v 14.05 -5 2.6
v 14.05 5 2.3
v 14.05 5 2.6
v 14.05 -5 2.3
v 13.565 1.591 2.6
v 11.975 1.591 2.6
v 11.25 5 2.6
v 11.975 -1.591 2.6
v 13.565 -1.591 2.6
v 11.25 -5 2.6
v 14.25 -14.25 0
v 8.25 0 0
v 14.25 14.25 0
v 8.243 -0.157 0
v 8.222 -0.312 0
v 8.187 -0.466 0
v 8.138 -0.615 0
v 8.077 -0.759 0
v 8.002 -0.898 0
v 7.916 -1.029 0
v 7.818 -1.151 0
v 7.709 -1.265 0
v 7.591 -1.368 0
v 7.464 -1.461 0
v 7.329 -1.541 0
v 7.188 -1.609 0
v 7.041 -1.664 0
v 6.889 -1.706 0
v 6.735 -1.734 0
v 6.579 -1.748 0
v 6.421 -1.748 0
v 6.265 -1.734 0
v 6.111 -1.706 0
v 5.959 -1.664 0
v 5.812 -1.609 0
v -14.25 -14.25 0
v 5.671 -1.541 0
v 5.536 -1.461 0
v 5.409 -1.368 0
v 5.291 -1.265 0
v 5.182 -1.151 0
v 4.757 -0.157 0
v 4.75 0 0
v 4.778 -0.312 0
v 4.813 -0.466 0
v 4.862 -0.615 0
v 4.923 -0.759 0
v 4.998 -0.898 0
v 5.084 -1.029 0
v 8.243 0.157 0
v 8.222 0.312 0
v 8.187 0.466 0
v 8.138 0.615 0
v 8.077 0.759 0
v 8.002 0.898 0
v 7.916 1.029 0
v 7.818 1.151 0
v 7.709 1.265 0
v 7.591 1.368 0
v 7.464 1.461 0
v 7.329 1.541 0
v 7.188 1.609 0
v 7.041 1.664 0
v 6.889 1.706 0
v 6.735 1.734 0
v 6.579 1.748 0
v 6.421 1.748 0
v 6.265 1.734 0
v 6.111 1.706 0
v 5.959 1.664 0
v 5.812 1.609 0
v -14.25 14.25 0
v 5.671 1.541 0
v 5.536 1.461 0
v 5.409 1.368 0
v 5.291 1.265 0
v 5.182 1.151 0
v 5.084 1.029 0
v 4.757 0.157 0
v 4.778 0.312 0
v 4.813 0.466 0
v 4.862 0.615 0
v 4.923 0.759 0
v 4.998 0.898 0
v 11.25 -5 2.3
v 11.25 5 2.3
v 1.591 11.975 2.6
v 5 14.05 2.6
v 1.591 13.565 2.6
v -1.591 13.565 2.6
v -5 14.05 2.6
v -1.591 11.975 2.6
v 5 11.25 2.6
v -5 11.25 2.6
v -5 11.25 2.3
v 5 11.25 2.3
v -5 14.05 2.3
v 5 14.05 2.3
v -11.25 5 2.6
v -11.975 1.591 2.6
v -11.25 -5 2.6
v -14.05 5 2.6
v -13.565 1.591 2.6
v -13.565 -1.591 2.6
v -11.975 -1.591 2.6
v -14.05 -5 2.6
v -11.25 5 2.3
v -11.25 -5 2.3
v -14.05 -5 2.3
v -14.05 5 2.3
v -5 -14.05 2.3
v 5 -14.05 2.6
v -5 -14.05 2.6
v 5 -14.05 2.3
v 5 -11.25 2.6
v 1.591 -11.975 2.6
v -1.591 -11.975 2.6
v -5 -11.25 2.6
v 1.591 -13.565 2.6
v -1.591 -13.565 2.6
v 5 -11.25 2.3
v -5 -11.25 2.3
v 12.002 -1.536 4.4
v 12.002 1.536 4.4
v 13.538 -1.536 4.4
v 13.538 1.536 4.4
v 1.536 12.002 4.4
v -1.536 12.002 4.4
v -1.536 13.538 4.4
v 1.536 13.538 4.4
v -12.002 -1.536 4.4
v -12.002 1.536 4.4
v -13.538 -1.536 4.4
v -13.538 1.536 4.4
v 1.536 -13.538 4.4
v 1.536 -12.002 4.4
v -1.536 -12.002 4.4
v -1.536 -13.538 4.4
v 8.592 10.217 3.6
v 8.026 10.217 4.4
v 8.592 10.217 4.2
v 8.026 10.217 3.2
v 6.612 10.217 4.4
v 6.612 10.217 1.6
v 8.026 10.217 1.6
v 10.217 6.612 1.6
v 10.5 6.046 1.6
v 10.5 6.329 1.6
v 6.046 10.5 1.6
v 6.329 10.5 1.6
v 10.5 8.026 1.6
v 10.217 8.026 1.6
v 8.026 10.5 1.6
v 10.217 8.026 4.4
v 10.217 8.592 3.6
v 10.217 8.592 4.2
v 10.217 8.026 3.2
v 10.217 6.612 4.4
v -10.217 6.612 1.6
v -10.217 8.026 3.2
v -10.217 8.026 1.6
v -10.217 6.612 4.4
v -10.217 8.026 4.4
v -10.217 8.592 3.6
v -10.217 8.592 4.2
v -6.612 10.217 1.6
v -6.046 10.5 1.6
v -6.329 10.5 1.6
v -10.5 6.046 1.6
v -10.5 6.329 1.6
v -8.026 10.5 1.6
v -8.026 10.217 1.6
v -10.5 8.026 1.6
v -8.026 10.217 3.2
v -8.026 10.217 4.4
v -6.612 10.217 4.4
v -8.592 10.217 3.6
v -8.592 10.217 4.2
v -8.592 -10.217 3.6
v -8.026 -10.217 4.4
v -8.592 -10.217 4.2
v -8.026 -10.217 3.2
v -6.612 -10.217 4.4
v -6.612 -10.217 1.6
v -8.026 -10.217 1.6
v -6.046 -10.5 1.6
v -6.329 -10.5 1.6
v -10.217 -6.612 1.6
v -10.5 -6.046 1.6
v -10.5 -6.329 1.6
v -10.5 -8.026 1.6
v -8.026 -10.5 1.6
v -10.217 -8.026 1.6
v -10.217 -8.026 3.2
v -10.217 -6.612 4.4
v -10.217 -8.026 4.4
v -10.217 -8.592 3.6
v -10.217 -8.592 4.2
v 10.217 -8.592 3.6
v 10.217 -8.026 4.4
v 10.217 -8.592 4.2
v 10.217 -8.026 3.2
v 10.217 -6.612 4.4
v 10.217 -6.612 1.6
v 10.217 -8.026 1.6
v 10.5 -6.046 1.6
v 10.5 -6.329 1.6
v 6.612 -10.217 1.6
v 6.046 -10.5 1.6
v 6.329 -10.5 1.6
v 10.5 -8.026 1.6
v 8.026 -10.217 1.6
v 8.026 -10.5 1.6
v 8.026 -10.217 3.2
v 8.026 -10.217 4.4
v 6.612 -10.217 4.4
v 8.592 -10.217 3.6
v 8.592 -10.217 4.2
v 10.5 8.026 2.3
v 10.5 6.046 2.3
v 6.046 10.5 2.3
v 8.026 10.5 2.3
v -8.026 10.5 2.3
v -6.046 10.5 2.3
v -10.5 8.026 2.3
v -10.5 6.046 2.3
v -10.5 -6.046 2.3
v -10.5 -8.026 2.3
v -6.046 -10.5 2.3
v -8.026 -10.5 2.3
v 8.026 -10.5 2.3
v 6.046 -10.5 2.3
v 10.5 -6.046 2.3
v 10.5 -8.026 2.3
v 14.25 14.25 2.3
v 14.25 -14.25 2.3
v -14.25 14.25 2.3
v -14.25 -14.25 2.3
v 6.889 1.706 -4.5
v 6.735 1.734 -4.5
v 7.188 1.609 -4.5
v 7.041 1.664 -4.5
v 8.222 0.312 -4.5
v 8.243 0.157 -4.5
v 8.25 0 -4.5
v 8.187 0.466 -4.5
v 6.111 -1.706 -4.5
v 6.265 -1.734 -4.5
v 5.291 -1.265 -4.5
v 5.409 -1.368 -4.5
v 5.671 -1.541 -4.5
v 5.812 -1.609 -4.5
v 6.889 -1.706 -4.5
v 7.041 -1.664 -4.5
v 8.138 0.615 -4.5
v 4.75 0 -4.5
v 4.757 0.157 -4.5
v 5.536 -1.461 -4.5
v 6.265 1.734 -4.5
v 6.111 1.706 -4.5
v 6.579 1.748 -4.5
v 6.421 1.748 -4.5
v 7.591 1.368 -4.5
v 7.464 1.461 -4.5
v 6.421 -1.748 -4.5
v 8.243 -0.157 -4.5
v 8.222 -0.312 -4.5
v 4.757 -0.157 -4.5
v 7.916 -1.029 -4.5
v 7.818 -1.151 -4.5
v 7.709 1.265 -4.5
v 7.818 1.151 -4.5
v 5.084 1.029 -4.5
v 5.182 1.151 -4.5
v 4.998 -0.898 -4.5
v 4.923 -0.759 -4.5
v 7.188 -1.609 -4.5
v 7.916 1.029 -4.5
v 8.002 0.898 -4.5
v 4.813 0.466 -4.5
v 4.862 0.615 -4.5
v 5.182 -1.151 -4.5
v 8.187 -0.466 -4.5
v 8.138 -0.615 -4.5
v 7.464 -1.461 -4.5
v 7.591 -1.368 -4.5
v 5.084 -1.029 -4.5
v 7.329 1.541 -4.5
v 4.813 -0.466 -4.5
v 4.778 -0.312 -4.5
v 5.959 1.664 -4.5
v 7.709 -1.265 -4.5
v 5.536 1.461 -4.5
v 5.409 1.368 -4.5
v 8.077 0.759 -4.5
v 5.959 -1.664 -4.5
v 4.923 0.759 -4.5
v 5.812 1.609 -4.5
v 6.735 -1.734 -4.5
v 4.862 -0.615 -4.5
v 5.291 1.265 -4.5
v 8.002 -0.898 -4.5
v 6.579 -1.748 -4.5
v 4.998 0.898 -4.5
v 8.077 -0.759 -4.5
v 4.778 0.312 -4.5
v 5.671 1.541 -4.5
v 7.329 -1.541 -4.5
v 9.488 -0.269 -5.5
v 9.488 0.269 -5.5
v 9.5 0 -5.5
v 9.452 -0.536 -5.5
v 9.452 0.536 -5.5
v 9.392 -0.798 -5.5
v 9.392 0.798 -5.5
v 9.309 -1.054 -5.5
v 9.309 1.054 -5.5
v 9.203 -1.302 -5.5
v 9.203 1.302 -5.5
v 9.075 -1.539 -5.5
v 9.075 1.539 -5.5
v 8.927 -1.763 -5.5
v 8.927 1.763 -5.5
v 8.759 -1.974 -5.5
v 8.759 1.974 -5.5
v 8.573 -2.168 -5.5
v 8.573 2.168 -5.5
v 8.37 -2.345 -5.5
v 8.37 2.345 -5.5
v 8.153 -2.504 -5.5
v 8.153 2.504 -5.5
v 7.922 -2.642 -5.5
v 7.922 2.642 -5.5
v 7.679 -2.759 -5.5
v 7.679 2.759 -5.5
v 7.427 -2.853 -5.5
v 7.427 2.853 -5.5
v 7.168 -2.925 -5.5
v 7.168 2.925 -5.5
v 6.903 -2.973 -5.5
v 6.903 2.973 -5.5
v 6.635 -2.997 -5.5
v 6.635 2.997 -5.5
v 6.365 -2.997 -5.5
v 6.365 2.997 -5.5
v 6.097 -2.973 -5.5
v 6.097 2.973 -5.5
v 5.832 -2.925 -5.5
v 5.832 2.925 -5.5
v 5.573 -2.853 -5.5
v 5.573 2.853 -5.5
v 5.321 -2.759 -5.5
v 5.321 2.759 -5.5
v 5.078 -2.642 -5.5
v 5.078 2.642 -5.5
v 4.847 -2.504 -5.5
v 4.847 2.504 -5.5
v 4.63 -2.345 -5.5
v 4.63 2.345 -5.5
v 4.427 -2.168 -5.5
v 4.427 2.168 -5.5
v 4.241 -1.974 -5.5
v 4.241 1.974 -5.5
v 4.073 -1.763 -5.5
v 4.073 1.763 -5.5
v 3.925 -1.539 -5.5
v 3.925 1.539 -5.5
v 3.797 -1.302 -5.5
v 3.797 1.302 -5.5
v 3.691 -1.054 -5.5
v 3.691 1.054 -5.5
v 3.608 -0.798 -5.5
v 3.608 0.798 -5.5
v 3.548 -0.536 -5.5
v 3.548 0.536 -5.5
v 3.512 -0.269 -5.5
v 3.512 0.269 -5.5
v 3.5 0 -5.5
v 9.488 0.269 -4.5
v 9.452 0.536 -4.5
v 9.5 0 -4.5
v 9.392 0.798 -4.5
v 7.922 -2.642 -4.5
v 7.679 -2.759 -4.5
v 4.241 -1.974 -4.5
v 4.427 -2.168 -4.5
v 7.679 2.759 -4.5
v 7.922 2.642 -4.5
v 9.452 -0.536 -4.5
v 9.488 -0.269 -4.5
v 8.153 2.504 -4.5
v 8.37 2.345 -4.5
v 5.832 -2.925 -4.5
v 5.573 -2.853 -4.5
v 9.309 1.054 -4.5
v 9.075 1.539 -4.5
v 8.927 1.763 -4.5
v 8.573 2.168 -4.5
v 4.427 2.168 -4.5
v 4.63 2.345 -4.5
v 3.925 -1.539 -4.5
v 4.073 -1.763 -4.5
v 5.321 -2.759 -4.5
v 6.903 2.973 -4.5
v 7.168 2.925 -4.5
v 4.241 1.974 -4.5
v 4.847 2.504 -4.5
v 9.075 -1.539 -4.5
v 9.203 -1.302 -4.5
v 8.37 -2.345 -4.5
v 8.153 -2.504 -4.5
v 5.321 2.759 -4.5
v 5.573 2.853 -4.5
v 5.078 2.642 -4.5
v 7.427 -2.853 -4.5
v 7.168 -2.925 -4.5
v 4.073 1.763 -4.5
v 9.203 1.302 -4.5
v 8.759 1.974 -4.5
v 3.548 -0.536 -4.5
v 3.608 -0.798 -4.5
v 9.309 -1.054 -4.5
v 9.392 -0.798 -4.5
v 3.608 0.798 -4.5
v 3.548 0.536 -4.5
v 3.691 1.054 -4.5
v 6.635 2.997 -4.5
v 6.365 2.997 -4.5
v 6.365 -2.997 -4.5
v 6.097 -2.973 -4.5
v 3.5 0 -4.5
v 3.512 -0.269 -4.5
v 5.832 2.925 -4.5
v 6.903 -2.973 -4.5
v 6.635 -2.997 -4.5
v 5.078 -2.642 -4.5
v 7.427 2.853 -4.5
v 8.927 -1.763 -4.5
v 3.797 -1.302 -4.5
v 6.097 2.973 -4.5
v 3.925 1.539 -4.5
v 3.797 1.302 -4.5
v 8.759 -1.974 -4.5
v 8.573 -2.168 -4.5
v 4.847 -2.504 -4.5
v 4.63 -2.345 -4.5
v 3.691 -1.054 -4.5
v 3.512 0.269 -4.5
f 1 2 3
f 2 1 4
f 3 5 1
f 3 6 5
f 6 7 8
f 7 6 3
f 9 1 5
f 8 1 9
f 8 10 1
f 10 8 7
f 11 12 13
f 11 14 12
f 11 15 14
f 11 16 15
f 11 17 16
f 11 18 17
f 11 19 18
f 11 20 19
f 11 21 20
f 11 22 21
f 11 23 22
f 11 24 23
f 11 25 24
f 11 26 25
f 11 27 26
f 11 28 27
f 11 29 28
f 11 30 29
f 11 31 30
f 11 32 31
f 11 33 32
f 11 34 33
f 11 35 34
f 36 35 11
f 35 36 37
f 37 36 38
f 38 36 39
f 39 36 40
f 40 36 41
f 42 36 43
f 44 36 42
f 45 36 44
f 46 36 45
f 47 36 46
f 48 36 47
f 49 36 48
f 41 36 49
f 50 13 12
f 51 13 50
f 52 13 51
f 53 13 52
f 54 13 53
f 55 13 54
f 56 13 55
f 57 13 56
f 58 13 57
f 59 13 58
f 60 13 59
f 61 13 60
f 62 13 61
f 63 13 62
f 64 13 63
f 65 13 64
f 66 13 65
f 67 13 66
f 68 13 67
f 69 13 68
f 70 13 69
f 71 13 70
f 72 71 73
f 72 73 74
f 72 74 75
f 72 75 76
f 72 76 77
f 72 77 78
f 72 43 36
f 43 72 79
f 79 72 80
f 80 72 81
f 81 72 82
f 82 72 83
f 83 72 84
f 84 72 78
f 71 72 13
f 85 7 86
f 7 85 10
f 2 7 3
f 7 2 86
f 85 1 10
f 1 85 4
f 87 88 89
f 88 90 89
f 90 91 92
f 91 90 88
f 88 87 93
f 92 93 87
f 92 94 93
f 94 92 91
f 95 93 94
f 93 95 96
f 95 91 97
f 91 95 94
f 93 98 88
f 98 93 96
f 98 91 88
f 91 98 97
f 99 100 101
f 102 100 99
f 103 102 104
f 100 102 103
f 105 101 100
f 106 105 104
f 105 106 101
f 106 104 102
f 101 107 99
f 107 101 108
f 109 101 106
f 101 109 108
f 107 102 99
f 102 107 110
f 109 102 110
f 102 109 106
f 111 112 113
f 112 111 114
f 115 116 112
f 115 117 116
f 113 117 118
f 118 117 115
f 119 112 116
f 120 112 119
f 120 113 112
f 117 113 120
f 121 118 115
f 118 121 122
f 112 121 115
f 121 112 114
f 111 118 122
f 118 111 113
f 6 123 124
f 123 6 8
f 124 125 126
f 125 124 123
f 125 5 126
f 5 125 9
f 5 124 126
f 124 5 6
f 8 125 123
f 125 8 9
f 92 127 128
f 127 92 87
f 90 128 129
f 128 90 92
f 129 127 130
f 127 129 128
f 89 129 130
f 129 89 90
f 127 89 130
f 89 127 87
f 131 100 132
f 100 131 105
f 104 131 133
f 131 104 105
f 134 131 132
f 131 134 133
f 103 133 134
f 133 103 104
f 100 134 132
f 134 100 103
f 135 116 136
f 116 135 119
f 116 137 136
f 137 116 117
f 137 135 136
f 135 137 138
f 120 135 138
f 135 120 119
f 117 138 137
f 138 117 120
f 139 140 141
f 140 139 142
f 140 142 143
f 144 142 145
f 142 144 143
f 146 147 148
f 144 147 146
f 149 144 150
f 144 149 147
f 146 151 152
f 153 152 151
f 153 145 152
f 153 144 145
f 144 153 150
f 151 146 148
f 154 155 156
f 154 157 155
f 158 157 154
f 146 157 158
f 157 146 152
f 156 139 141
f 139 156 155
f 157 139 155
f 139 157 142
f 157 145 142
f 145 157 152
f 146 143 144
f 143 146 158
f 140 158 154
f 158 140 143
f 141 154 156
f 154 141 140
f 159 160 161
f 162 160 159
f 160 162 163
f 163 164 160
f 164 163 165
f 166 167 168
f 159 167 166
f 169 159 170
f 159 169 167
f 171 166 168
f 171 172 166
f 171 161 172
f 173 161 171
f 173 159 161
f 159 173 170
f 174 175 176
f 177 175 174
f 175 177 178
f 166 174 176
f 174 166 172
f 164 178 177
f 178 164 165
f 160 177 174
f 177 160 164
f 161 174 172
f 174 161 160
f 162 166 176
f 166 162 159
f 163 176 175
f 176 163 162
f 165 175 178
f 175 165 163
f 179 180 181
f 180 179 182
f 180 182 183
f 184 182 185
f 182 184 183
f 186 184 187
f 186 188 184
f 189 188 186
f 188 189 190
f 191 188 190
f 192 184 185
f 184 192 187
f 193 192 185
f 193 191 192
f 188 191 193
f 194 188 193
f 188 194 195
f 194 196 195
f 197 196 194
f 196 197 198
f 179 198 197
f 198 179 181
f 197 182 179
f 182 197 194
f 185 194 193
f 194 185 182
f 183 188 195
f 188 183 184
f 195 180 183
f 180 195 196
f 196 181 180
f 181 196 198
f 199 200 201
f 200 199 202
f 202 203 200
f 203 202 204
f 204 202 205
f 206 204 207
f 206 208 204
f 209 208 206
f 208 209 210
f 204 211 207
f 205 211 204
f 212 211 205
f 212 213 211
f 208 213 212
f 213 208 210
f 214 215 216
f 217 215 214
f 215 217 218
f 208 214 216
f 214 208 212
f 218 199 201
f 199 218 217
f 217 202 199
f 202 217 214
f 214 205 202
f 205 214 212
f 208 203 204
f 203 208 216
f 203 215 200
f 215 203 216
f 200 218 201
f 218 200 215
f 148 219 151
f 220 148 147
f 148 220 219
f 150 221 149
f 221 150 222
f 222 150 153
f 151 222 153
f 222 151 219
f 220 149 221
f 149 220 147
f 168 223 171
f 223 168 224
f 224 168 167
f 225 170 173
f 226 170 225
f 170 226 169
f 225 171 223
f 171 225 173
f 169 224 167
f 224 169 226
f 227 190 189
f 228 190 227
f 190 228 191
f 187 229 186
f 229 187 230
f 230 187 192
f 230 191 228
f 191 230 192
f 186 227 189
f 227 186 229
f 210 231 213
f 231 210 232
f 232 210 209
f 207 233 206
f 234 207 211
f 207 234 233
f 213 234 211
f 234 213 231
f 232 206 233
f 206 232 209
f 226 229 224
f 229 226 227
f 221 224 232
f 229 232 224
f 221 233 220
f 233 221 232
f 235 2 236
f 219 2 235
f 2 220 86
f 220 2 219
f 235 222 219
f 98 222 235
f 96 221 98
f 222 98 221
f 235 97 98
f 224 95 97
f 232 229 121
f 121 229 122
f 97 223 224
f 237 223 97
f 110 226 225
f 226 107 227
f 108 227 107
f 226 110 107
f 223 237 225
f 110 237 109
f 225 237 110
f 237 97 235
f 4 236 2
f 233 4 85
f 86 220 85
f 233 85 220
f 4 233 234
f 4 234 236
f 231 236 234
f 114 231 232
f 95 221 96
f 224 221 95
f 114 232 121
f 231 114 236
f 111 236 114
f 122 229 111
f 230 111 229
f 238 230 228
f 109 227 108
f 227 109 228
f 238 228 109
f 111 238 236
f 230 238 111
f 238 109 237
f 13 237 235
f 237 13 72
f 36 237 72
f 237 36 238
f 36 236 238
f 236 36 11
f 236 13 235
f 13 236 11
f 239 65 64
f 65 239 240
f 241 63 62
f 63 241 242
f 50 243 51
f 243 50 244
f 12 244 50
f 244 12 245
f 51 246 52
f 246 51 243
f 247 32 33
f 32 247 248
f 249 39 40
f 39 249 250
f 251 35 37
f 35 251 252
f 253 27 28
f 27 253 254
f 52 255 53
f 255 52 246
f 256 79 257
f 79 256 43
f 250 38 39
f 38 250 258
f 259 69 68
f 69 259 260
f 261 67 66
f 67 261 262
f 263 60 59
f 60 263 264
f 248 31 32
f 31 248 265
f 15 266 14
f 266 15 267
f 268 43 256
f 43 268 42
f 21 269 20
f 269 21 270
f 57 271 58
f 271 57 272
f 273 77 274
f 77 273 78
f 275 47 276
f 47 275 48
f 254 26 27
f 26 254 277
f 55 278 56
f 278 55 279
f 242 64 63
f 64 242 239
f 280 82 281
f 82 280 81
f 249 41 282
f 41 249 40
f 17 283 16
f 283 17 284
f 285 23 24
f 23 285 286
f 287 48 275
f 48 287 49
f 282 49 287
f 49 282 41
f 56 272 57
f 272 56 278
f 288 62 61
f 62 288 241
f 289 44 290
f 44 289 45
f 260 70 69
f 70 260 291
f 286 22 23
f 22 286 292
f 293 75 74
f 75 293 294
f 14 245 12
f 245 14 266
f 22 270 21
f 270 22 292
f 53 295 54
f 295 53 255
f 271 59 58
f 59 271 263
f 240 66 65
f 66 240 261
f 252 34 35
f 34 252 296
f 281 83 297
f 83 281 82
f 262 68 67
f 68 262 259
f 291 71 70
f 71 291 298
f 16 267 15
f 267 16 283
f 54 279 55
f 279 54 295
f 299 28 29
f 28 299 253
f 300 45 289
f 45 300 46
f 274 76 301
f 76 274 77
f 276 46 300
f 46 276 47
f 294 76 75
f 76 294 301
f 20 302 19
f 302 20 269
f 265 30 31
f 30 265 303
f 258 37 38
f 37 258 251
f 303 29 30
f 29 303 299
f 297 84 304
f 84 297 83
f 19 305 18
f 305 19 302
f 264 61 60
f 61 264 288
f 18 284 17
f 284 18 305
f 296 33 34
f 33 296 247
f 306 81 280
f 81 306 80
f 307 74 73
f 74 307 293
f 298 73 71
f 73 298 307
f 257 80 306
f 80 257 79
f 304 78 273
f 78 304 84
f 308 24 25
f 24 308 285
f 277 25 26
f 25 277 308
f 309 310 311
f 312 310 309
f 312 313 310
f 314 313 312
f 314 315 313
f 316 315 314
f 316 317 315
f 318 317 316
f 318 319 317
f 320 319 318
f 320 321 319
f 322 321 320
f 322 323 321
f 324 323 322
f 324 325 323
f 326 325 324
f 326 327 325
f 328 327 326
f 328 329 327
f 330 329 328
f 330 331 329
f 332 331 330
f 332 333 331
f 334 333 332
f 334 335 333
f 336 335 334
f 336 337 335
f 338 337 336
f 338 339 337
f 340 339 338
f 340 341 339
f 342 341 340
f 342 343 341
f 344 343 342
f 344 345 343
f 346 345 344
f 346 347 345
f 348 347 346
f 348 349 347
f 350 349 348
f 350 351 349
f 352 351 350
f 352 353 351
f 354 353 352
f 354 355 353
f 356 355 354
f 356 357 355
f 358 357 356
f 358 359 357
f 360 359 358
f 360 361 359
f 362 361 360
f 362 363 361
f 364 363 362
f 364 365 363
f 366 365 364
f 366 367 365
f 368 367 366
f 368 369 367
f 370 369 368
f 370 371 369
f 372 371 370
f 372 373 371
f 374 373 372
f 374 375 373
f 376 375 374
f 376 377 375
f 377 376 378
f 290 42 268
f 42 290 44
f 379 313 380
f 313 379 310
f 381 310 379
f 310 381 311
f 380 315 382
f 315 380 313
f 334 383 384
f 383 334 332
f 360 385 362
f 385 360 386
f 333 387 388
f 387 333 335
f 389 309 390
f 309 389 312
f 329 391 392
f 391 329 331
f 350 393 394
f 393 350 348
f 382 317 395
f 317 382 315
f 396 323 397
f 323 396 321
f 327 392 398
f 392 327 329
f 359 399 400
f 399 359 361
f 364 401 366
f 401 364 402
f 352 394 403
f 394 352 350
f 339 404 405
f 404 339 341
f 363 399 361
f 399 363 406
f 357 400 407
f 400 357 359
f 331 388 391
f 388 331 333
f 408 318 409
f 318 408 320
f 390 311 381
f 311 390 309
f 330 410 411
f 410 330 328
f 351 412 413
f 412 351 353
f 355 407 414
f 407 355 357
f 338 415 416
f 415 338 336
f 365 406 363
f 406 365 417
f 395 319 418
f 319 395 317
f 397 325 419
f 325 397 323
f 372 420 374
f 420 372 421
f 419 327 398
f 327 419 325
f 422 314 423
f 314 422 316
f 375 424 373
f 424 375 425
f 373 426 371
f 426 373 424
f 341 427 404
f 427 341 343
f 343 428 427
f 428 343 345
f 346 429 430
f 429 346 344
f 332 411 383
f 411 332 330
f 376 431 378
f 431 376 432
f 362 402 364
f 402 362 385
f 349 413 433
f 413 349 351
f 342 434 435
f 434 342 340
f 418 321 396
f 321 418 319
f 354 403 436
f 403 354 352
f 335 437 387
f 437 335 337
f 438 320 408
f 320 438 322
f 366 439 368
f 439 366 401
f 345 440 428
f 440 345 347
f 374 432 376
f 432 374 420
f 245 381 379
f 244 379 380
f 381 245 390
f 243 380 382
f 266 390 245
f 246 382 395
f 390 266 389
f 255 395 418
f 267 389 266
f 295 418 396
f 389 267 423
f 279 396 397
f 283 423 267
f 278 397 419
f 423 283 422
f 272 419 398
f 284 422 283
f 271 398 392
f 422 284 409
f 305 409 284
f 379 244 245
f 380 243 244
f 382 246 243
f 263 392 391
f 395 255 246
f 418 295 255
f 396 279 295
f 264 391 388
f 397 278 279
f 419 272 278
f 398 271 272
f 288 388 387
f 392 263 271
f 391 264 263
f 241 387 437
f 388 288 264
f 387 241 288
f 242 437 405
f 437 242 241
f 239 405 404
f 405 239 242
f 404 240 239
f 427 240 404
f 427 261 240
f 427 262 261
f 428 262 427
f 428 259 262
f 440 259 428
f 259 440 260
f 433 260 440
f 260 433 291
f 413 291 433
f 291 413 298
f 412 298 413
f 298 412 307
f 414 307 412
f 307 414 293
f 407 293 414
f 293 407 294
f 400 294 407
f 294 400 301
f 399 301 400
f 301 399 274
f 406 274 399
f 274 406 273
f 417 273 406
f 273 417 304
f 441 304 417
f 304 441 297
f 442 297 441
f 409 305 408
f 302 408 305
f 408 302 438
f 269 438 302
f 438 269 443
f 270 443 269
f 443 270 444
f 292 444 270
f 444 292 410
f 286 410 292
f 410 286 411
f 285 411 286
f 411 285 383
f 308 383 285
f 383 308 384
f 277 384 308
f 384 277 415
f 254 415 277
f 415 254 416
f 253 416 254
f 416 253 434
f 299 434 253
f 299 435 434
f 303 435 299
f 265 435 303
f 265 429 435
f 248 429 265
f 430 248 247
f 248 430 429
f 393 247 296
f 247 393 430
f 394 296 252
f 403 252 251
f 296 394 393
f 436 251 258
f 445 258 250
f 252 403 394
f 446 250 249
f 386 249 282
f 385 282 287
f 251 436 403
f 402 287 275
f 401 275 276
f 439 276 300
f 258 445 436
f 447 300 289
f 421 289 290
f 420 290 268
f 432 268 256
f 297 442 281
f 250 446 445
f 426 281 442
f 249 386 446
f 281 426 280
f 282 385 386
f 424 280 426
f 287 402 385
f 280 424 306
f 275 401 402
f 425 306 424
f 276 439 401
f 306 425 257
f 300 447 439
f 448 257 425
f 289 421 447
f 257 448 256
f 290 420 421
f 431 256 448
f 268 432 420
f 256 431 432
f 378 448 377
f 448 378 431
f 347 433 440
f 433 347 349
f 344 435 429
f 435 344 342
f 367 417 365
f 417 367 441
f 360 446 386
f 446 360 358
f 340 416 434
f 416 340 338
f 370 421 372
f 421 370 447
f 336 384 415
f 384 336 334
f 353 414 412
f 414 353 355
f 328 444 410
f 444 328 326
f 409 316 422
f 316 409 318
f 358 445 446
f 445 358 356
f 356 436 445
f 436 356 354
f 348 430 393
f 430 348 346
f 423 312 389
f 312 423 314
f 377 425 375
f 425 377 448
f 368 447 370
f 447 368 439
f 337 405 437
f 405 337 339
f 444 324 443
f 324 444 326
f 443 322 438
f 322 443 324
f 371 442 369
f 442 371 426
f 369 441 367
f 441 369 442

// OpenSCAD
// file: tile_base.scad
// Copyright 2025 - Marcin Raczkowski (Marmot.Tech)
//
// Licence: https://creativecommons.org/licenses/by-sa/4.0/
//
// Reference/Specs: https://github.com/FrameworkComputer/Framework-Desktop/blob/main/Tiles/FRAMEWORK_DESKTOP_BLANK_TILE_V0.pdf

/* [General] */

// What element to display
tile_type = "all"; // ["all", "blank", "horizontal", "cross", "frame", "mounts (debug)"]
// Colorize elements (preview only)
$colorize_elements = true;
// Tolerance [mm]
tolerance = 0.4;
// Hatch Angle [deg]
hatch_angle = 45;
// Hatch Line Thickness [mm]
hatch_thickness = 1.125;

/* [Specification (Avoid Changing)] */

// Front Thickness [mm]
front_thickness = 2.3; // .1
// Frame Thickness [mm]
frame_thickness = 2.3;
// Inner Size
inner_size = 21.0;

// Width/Height of the singular tile [mm]
tile_size = 28.5;

// All height measurements are from the base

raised_edge_size = [2.8, 10.0, 2.6];

constraint_size = [1.6, 3.2, 4.4];
constraint_offset = 11.97;
constraint_slope = 0.96; //0.01

hook_size   = [1.0, 6.0, 4.4];
hook_offset = 12.90;
hook_base   = [3.2, 1.6];
hook_thickness = 0.4;

/* [Hidden] */

$ff = 0.02; // fudge factor - to fix any rendering issues
width = tile_size - tolerance;
height = tile_size - tolerance;
trim = inner_size/2;

module part_color(c) {
  if ($preview && $colorize_elements) {
    color(c) children();
  } else children();
}

module raised_edges() {
  for(r = [0:3]) {
    rotate([0,0,90*r])
      translate([(width - raised_edge_size[0]) / 2, 0, raised_edge_size[2]/2])
        cube(raised_edge_size, center=true);
    ;
  }
}

module constraints(base = frame_thickness) {
  for(r = [0:3]) {
    rotate([0,0,90*r])
      translate([constraint_offset + constraint_size[0]/2, 0, base])
        linear_extrude(constraint_size[2]-base, scale=constraint_slope)
        square([constraint_size[0], constraint_size[1]], center=true);
    ;
  }
}

module hooks(w=hook_thickness, h=1.2, trim_margin = tolerance) {
  hd = hook_size[0];
  hw = hook_size[1];
  hh = hook_size[2];
  
  bw = hook_base[0];
  bh = hook_base[1];
  
  hook_profile = [
    [0, 0],   // top middle
    [w, w/2],   // hook top
    [w, h-w],
    [0, h],   // hook bottom
    [0, hh],  // bottom front
    [-hd, hh], // top back
    [-hd, 0], // top back
  ];
  
  part_color("red") for(r = [0:3])
    rotate([0, 0, 45 + 90*r]) {
      intersection(){
        // Cube that trims the hook to the inner edge of the frame
        translate([(inner_size-trim)*sqrt(2)/2-trim_margin, 0, bh+trim/2])
          rotate([0, 0, 45]) cube(trim, center=true);
        // Hook shape
        translate([hook_offset, 0, hook_size[2]])
          rotate([-90, 0, 0]) 
            linear_extrude(hook_size[1], center=true) 
              polygon(hook_profile);
      }
        // Base to attach to frame
      translate([hook_offset-hd, -hw/2, 0])
        cube([bw+hd, hw, bh]);
    }
}

// Cutout around the neck of the hook that coerces the slicer 
// to generate stronger borders / walls around the hook neck.
module hook_cutout(b=hook_base[1]) {
  trim_margin = 0;
  h = hook_size[2] - b;
  
  for(r = [0:3])
    rotate([0, 0, 45 + 90*r])
      intersection(){
        // Cube that trims the hook to the inner edge of the frame
        translate([(inner_size-trim)*sqrt(2)/2-trim_margin, 0, b+trim/2])
          rotate([0, 0, 45]) cube(trim, center=true);
        translate([hook_offset - hook_size[0]/2, 0, b+h/2])
          cube([hook_size[0]+tolerance, hook_size[1]+tolerance, h], center=true);
      }
}


module frame() {
  difference() { 
    linear_extrude(frame_thickness) 
      difference() {
        square(tile_size, center=true);
        square(inner_size, center=true);
      }
    hook_cutout();
  }
}

module solid_fill() {
  difference() {
    linear_extrude(front_thickness)
      square(inner_size, center=true);
    hook_cutout();
  }
}


module crosshatch_fill(angle = hatch_angle, thickness = hatch_thickness) {
  n = ceil(inner_size / thickness / 2)+1;
  difference() {
    linear_extrude(front_thickness) intersection() {
      square(inner_size, center=true);
      
      union() for(i = [n/-2:n/2]) {
        rotate([0, 0, angle]) translate([0, thickness*2*i])
          square([inner_size * 2, thickness], center=true);
      }
    }
    
    hook_cutout();
  }
}

module horizontal_fill() {
  crosshatch_fill(0);
}


/* --- */

module mounts() {
  part_color("maroon") raised_edges();
  part_color("orange") constraints();
  part_color("red")    hooks();
}

module full_frame() {
  mounts();
  part_color("blue")   frame();
}

module blank_tile() {
  full_frame();
  solid_fill();
}

if (tile_type == "all") {
  translate([ 0,  0, 0]) { full_frame(); }
  translate([ 0, 30, 0]) { full_frame(); solid_fill(); }
  translate([30, 30, 0]) { full_frame(); crosshatch_fill(); }
  translate([30,  0, 0]) { full_frame(); horizontal_fill(); }
} else if (tile_type == "mounts") {
  mounts();
} else if (tile_type == "frame") {
  full_frame();
} else if (tile_type == "blank") {
  blank_tile();
} else if (tile_type == "cross") {
  full_frame();
  crosshatch_fill();
} else if (tile_type == "horizontal") {
  full_frame();
  horizontal_fill();
};


/*
 * Usage:
 *
 * include <tile_base.scad>
 * tile_type = "none";
 * $colorize_parts = false;
 *
 * union() {
 *   full_frame(); // (or just mounts())
 *   my_design();
 * }
 *
 * // or
 *
 * difference(){
 *   blank_tile();
 *   carve_out();
 * }
 *
 */
// main file
include <tile_base.scad>
tile_type = "blank";
$colorize_parts = false;
$fn = 70;
union() {
    full_frame();
    mount();
}
module mount() {
    translate([6.5, 0, -5.5]){
        cylinder(7.8, 1.75, 1.75);
        cylinder(1,3,3);
    }
    
}
